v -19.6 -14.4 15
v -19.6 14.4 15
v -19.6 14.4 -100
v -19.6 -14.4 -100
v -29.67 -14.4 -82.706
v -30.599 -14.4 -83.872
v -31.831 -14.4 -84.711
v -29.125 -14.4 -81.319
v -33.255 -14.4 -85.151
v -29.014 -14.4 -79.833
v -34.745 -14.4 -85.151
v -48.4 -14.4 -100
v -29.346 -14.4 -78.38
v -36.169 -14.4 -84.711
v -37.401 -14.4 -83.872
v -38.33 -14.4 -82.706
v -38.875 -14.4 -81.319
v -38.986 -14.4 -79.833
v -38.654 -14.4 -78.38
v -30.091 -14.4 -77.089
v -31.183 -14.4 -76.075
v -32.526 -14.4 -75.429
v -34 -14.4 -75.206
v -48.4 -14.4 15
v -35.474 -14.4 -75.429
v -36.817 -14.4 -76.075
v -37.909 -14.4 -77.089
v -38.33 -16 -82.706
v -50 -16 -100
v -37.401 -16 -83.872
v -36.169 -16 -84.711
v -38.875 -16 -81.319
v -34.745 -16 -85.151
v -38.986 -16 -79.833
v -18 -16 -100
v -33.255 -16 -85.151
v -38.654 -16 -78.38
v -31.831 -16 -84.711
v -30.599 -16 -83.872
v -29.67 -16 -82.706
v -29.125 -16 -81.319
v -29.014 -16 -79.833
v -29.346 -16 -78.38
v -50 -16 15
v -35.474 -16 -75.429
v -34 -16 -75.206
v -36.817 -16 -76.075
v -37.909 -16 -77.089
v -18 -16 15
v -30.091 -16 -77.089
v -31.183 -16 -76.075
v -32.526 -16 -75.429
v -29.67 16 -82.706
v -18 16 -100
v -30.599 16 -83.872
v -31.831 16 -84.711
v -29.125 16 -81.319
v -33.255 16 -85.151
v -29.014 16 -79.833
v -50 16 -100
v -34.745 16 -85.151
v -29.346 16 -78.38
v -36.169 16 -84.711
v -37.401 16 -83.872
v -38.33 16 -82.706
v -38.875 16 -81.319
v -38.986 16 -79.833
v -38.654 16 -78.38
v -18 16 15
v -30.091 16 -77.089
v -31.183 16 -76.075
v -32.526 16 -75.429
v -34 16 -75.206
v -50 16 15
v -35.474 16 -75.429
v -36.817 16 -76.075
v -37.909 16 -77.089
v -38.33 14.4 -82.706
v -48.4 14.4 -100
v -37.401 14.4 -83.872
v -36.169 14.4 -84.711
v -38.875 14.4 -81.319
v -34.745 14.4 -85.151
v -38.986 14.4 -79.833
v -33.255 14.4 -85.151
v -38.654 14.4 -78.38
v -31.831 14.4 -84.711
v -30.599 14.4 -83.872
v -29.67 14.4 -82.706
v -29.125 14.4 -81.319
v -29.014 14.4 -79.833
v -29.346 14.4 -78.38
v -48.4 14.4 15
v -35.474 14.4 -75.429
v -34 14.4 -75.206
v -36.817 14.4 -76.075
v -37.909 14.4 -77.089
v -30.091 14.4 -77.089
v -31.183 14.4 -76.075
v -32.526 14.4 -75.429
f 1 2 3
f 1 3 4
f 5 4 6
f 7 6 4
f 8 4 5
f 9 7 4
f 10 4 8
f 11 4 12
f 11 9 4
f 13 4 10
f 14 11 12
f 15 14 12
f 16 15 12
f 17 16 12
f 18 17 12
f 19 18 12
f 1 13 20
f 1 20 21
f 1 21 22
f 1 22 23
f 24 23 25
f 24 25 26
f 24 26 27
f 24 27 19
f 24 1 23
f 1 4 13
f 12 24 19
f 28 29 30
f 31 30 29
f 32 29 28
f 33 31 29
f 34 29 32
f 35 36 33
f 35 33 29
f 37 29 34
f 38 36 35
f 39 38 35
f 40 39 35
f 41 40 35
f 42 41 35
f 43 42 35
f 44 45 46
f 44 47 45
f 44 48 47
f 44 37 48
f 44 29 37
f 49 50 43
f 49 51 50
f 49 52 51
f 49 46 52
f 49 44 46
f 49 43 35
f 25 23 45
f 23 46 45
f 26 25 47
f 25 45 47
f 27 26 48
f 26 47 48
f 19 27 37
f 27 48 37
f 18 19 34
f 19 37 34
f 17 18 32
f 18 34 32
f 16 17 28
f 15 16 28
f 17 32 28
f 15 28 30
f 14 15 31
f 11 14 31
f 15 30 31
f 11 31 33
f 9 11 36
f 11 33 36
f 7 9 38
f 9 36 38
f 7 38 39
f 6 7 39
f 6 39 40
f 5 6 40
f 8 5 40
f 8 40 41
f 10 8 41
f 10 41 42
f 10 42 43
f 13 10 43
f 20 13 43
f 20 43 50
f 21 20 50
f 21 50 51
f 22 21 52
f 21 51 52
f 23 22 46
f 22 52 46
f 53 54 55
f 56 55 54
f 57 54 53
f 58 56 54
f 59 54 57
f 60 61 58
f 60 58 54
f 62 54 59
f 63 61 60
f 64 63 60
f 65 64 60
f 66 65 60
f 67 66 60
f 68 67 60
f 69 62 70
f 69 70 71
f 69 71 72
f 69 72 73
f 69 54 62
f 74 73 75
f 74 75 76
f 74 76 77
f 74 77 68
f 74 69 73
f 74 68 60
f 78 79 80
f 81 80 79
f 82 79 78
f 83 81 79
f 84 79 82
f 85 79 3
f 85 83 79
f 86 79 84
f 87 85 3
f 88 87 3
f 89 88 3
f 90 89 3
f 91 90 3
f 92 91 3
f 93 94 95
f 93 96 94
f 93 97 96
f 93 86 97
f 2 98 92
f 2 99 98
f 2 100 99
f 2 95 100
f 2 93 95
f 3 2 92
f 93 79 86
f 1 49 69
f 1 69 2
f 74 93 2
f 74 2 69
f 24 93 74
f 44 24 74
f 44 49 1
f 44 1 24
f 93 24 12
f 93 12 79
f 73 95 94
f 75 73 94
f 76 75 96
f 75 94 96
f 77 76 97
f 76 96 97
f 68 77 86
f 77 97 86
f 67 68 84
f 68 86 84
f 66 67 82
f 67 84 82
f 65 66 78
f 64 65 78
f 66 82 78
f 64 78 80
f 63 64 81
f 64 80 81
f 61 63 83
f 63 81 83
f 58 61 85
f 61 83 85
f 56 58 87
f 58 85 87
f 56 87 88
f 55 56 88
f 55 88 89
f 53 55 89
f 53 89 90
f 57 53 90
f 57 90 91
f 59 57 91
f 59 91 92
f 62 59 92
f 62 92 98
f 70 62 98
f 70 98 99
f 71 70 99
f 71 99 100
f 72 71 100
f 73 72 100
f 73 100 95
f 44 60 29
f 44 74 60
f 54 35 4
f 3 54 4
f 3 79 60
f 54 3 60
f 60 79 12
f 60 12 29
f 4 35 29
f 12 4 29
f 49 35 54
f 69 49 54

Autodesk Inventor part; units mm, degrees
ref_plane "YZ Plane" through (0, 0, 0) normal (1, 0, 0) x (0, 1, 0)
ref_plane "XZ Plane" through (0, 0, 0) normal (0, 1, 0) x (-1, 0, 0)
sketch "スケッチ1" plane through (0, 0, 0) normal (0, 1, 0) x (-1, 0, 0)
  line L0 (-901.8, 0) -> (67, 0)
  line L1 (-417.4, -1177.3333) -> (67, 0)
  line L2 (50, -15) -> (50, 15)
  line L3 (24, 15) -> (24, -15)
  line L4 (24, -15) -> (84, -15)
  line L5 (84, 15) -> (84, -15)
  line L6 (-514.28, 15) -> (163.88, 15)
  line L7 (34, 15) -> (34, -80.2064)
  point P0 (0, 0)
  dimension "d0" = 16
ref_plane "作業平面1" through (514.28, 0, 15) normal (0, 0, 1) x (-1, 0, 0)
sketch "スケッチ2" plane through (514.28, 0, 15) normal (0, 0, 1) x (-1, 0, 0)
  line L0 (0, 0) -> (678.16, 0) projected
  line L1 (532.28, -16) -> (564.28, -16)
  line L2 (564.28, -16) -> (564.28, 16)
  line L3 (564.28, 16) -> (532.28, 16)
  line L4 (532.28, 16) -> (532.28, -16)
  line L5 (532.28, -16) -> (564.28, 16) construction
  line L6 (564.28, -16) -> (532.28, 16) construction
  line L7 (562.68, -14.4) -> (533.88, -14.4)
  line L8 (533.88, -14.4) -> (533.88, 14.4)
  line L9 (533.88, 14.4) -> (562.68, 14.4)
  line L10 (562.68, 14.4) -> (562.68, -14.4)
  point P0 (514.28, 0)
  point P1 (564.28, 0)
  point P2 (564.28, 0)
  point P3 (564.28, 0)
  point P4 (548.28, 0)
  point P5 (548.28, 0)
  point P6 (548.28, 0)
  dimension "d2" = 32
  dimension "d3" = 1.6
extrude "押し出し1" add sketch "スケッチ2" against normal blind 115 contours L4 L3 L2 L0 L10 L9 L8 | L0 L8 L7 L10 L2 L1 L4
sketch "スケッチ3" plane through (-50, 16, 15) normal (0, 1, 0) x (1, 0, 0)
  line L0 (467.4, 1192.3333) -> (-17, 15) projected
  line L1 (951.8, 15) -> (-17, 15) projected
  line L2 (16, 0) -> (16, 95.2064) projected
  point P0 (50, 15)
  point P1 (16, 95.2064)
hole "穴1" at (-34, 16, -80.2064) direction (0, -1, 0) diameter 10 end through all
properties part number "ステア棒"
